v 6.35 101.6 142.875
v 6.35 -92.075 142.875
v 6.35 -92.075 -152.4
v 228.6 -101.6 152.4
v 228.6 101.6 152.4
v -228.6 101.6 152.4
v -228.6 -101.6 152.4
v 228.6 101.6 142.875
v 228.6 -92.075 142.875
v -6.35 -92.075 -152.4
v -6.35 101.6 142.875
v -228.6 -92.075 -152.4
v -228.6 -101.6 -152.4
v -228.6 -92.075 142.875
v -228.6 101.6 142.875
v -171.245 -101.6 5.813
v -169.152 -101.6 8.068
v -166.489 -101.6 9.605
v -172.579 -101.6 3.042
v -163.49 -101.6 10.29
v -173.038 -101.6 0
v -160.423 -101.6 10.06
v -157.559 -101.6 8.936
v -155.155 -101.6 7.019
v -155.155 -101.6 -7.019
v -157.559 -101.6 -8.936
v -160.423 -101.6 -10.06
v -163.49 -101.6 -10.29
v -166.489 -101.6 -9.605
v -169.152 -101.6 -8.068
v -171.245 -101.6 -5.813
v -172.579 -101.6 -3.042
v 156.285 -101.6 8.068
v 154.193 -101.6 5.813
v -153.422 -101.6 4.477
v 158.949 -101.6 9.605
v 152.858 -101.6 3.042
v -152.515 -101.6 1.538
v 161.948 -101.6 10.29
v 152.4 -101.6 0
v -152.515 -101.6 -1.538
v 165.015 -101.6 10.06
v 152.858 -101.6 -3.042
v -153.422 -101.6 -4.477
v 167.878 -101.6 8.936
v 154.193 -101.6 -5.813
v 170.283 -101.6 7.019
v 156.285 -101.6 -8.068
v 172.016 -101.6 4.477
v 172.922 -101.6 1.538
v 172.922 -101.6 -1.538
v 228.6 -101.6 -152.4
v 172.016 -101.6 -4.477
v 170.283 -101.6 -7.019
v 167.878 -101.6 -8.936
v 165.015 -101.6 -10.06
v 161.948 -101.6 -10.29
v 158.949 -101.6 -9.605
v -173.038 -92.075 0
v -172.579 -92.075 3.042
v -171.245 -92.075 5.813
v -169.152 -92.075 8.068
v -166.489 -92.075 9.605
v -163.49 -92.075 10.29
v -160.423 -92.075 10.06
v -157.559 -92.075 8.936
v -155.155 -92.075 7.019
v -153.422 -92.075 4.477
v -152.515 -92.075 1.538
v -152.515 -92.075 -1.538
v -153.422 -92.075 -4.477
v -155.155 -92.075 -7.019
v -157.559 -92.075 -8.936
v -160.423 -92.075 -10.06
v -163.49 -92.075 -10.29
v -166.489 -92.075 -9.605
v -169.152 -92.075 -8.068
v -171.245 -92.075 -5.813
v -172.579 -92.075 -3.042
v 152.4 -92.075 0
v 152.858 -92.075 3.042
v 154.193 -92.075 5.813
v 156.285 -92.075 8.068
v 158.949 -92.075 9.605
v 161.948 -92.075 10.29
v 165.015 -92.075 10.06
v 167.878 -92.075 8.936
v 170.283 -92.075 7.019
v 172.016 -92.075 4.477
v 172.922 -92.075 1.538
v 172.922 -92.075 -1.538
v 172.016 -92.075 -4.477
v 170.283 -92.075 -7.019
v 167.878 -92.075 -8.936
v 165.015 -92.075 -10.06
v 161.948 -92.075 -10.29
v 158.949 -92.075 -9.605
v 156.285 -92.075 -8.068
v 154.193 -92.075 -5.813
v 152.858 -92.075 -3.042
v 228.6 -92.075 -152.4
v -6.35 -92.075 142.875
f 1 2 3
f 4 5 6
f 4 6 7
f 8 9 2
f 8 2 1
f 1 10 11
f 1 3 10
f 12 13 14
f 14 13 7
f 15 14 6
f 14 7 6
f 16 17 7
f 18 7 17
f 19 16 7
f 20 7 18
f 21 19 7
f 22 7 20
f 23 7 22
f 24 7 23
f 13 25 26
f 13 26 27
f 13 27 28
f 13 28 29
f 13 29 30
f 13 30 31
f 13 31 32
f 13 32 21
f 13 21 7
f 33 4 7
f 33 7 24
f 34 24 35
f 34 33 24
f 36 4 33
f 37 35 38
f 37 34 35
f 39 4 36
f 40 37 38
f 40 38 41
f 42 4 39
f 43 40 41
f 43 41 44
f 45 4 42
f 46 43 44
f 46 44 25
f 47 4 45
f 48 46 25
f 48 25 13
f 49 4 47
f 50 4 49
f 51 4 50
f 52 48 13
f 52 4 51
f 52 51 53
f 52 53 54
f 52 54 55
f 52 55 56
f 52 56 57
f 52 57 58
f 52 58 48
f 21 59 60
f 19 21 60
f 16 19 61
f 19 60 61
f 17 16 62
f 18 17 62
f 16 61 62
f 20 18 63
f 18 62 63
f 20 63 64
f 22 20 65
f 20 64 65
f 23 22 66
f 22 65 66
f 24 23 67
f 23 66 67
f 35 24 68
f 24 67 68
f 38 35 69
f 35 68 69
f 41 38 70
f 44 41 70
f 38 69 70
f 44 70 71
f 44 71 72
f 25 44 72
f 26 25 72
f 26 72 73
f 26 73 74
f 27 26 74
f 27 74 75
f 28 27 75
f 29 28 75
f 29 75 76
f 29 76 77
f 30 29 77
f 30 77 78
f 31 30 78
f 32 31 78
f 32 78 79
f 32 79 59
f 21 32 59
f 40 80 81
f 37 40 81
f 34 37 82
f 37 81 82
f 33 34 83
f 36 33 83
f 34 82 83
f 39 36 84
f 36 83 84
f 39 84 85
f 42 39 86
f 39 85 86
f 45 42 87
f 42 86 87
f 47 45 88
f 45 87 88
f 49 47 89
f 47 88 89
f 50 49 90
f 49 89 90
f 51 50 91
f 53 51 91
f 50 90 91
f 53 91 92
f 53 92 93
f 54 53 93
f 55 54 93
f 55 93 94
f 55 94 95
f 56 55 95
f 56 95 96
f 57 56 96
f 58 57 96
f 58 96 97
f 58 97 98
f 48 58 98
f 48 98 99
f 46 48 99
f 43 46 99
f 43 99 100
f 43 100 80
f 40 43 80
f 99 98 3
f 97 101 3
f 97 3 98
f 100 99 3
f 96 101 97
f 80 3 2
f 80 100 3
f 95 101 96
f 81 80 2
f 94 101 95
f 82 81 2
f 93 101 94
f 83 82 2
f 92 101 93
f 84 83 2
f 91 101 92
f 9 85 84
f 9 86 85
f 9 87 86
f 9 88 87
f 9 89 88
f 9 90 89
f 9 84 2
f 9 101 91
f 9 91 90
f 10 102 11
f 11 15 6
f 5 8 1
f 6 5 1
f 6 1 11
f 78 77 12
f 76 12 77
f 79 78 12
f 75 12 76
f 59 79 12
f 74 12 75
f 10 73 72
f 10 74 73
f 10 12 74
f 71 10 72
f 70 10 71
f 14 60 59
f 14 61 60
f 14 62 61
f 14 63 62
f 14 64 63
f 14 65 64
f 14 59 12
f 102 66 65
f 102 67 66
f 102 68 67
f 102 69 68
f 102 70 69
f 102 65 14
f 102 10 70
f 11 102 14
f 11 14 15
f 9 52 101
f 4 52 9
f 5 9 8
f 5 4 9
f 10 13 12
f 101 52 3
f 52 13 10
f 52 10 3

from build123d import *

# Parameters (mm, degrees)
F1_DEPTH = 228.6
F3_DEPTH = 6.35
F4_R     = 10.31875
F5_DEPTH = 25.4


with BuildPart() as f1:
    # F0 (on Right) → F1 (new body, symmetric)
    with BuildSketch(Plane.YZ):
        Polygon((101.6, 142.875), (101.6, 152.4), (-101.6, 152.4), (-101.6, -152.4), (-92.075, -152.4), (-92.075, 142.875), align=None)
    extrude(amount=F1_DEPTH, both=True)

    # F2 (on Right) → F3 (join, symmetric)
    with BuildSketch(Plane.YZ):
        Polygon((-92.075, -152.4), (101.6, 142.875), (-92.075, 142.875), align=None)
    extrude(amount=F3_DEPTH, both=True)

    # F4 (on face) → F5 (cut)
    with BuildSketch(Plane(origin=(0, -92.075, 0), x_dir=(-1, 0, 0), z_dir=(0, 1, 0))):
        with Locations((-162.71875, 0)):
            Circle(F4_R)
        with Locations((162.71875, 0)):
            Circle(F4_R)
    extrude(amount=-F5_DEPTH, mode=Mode.SUBTRACT)


solid = f1.part
